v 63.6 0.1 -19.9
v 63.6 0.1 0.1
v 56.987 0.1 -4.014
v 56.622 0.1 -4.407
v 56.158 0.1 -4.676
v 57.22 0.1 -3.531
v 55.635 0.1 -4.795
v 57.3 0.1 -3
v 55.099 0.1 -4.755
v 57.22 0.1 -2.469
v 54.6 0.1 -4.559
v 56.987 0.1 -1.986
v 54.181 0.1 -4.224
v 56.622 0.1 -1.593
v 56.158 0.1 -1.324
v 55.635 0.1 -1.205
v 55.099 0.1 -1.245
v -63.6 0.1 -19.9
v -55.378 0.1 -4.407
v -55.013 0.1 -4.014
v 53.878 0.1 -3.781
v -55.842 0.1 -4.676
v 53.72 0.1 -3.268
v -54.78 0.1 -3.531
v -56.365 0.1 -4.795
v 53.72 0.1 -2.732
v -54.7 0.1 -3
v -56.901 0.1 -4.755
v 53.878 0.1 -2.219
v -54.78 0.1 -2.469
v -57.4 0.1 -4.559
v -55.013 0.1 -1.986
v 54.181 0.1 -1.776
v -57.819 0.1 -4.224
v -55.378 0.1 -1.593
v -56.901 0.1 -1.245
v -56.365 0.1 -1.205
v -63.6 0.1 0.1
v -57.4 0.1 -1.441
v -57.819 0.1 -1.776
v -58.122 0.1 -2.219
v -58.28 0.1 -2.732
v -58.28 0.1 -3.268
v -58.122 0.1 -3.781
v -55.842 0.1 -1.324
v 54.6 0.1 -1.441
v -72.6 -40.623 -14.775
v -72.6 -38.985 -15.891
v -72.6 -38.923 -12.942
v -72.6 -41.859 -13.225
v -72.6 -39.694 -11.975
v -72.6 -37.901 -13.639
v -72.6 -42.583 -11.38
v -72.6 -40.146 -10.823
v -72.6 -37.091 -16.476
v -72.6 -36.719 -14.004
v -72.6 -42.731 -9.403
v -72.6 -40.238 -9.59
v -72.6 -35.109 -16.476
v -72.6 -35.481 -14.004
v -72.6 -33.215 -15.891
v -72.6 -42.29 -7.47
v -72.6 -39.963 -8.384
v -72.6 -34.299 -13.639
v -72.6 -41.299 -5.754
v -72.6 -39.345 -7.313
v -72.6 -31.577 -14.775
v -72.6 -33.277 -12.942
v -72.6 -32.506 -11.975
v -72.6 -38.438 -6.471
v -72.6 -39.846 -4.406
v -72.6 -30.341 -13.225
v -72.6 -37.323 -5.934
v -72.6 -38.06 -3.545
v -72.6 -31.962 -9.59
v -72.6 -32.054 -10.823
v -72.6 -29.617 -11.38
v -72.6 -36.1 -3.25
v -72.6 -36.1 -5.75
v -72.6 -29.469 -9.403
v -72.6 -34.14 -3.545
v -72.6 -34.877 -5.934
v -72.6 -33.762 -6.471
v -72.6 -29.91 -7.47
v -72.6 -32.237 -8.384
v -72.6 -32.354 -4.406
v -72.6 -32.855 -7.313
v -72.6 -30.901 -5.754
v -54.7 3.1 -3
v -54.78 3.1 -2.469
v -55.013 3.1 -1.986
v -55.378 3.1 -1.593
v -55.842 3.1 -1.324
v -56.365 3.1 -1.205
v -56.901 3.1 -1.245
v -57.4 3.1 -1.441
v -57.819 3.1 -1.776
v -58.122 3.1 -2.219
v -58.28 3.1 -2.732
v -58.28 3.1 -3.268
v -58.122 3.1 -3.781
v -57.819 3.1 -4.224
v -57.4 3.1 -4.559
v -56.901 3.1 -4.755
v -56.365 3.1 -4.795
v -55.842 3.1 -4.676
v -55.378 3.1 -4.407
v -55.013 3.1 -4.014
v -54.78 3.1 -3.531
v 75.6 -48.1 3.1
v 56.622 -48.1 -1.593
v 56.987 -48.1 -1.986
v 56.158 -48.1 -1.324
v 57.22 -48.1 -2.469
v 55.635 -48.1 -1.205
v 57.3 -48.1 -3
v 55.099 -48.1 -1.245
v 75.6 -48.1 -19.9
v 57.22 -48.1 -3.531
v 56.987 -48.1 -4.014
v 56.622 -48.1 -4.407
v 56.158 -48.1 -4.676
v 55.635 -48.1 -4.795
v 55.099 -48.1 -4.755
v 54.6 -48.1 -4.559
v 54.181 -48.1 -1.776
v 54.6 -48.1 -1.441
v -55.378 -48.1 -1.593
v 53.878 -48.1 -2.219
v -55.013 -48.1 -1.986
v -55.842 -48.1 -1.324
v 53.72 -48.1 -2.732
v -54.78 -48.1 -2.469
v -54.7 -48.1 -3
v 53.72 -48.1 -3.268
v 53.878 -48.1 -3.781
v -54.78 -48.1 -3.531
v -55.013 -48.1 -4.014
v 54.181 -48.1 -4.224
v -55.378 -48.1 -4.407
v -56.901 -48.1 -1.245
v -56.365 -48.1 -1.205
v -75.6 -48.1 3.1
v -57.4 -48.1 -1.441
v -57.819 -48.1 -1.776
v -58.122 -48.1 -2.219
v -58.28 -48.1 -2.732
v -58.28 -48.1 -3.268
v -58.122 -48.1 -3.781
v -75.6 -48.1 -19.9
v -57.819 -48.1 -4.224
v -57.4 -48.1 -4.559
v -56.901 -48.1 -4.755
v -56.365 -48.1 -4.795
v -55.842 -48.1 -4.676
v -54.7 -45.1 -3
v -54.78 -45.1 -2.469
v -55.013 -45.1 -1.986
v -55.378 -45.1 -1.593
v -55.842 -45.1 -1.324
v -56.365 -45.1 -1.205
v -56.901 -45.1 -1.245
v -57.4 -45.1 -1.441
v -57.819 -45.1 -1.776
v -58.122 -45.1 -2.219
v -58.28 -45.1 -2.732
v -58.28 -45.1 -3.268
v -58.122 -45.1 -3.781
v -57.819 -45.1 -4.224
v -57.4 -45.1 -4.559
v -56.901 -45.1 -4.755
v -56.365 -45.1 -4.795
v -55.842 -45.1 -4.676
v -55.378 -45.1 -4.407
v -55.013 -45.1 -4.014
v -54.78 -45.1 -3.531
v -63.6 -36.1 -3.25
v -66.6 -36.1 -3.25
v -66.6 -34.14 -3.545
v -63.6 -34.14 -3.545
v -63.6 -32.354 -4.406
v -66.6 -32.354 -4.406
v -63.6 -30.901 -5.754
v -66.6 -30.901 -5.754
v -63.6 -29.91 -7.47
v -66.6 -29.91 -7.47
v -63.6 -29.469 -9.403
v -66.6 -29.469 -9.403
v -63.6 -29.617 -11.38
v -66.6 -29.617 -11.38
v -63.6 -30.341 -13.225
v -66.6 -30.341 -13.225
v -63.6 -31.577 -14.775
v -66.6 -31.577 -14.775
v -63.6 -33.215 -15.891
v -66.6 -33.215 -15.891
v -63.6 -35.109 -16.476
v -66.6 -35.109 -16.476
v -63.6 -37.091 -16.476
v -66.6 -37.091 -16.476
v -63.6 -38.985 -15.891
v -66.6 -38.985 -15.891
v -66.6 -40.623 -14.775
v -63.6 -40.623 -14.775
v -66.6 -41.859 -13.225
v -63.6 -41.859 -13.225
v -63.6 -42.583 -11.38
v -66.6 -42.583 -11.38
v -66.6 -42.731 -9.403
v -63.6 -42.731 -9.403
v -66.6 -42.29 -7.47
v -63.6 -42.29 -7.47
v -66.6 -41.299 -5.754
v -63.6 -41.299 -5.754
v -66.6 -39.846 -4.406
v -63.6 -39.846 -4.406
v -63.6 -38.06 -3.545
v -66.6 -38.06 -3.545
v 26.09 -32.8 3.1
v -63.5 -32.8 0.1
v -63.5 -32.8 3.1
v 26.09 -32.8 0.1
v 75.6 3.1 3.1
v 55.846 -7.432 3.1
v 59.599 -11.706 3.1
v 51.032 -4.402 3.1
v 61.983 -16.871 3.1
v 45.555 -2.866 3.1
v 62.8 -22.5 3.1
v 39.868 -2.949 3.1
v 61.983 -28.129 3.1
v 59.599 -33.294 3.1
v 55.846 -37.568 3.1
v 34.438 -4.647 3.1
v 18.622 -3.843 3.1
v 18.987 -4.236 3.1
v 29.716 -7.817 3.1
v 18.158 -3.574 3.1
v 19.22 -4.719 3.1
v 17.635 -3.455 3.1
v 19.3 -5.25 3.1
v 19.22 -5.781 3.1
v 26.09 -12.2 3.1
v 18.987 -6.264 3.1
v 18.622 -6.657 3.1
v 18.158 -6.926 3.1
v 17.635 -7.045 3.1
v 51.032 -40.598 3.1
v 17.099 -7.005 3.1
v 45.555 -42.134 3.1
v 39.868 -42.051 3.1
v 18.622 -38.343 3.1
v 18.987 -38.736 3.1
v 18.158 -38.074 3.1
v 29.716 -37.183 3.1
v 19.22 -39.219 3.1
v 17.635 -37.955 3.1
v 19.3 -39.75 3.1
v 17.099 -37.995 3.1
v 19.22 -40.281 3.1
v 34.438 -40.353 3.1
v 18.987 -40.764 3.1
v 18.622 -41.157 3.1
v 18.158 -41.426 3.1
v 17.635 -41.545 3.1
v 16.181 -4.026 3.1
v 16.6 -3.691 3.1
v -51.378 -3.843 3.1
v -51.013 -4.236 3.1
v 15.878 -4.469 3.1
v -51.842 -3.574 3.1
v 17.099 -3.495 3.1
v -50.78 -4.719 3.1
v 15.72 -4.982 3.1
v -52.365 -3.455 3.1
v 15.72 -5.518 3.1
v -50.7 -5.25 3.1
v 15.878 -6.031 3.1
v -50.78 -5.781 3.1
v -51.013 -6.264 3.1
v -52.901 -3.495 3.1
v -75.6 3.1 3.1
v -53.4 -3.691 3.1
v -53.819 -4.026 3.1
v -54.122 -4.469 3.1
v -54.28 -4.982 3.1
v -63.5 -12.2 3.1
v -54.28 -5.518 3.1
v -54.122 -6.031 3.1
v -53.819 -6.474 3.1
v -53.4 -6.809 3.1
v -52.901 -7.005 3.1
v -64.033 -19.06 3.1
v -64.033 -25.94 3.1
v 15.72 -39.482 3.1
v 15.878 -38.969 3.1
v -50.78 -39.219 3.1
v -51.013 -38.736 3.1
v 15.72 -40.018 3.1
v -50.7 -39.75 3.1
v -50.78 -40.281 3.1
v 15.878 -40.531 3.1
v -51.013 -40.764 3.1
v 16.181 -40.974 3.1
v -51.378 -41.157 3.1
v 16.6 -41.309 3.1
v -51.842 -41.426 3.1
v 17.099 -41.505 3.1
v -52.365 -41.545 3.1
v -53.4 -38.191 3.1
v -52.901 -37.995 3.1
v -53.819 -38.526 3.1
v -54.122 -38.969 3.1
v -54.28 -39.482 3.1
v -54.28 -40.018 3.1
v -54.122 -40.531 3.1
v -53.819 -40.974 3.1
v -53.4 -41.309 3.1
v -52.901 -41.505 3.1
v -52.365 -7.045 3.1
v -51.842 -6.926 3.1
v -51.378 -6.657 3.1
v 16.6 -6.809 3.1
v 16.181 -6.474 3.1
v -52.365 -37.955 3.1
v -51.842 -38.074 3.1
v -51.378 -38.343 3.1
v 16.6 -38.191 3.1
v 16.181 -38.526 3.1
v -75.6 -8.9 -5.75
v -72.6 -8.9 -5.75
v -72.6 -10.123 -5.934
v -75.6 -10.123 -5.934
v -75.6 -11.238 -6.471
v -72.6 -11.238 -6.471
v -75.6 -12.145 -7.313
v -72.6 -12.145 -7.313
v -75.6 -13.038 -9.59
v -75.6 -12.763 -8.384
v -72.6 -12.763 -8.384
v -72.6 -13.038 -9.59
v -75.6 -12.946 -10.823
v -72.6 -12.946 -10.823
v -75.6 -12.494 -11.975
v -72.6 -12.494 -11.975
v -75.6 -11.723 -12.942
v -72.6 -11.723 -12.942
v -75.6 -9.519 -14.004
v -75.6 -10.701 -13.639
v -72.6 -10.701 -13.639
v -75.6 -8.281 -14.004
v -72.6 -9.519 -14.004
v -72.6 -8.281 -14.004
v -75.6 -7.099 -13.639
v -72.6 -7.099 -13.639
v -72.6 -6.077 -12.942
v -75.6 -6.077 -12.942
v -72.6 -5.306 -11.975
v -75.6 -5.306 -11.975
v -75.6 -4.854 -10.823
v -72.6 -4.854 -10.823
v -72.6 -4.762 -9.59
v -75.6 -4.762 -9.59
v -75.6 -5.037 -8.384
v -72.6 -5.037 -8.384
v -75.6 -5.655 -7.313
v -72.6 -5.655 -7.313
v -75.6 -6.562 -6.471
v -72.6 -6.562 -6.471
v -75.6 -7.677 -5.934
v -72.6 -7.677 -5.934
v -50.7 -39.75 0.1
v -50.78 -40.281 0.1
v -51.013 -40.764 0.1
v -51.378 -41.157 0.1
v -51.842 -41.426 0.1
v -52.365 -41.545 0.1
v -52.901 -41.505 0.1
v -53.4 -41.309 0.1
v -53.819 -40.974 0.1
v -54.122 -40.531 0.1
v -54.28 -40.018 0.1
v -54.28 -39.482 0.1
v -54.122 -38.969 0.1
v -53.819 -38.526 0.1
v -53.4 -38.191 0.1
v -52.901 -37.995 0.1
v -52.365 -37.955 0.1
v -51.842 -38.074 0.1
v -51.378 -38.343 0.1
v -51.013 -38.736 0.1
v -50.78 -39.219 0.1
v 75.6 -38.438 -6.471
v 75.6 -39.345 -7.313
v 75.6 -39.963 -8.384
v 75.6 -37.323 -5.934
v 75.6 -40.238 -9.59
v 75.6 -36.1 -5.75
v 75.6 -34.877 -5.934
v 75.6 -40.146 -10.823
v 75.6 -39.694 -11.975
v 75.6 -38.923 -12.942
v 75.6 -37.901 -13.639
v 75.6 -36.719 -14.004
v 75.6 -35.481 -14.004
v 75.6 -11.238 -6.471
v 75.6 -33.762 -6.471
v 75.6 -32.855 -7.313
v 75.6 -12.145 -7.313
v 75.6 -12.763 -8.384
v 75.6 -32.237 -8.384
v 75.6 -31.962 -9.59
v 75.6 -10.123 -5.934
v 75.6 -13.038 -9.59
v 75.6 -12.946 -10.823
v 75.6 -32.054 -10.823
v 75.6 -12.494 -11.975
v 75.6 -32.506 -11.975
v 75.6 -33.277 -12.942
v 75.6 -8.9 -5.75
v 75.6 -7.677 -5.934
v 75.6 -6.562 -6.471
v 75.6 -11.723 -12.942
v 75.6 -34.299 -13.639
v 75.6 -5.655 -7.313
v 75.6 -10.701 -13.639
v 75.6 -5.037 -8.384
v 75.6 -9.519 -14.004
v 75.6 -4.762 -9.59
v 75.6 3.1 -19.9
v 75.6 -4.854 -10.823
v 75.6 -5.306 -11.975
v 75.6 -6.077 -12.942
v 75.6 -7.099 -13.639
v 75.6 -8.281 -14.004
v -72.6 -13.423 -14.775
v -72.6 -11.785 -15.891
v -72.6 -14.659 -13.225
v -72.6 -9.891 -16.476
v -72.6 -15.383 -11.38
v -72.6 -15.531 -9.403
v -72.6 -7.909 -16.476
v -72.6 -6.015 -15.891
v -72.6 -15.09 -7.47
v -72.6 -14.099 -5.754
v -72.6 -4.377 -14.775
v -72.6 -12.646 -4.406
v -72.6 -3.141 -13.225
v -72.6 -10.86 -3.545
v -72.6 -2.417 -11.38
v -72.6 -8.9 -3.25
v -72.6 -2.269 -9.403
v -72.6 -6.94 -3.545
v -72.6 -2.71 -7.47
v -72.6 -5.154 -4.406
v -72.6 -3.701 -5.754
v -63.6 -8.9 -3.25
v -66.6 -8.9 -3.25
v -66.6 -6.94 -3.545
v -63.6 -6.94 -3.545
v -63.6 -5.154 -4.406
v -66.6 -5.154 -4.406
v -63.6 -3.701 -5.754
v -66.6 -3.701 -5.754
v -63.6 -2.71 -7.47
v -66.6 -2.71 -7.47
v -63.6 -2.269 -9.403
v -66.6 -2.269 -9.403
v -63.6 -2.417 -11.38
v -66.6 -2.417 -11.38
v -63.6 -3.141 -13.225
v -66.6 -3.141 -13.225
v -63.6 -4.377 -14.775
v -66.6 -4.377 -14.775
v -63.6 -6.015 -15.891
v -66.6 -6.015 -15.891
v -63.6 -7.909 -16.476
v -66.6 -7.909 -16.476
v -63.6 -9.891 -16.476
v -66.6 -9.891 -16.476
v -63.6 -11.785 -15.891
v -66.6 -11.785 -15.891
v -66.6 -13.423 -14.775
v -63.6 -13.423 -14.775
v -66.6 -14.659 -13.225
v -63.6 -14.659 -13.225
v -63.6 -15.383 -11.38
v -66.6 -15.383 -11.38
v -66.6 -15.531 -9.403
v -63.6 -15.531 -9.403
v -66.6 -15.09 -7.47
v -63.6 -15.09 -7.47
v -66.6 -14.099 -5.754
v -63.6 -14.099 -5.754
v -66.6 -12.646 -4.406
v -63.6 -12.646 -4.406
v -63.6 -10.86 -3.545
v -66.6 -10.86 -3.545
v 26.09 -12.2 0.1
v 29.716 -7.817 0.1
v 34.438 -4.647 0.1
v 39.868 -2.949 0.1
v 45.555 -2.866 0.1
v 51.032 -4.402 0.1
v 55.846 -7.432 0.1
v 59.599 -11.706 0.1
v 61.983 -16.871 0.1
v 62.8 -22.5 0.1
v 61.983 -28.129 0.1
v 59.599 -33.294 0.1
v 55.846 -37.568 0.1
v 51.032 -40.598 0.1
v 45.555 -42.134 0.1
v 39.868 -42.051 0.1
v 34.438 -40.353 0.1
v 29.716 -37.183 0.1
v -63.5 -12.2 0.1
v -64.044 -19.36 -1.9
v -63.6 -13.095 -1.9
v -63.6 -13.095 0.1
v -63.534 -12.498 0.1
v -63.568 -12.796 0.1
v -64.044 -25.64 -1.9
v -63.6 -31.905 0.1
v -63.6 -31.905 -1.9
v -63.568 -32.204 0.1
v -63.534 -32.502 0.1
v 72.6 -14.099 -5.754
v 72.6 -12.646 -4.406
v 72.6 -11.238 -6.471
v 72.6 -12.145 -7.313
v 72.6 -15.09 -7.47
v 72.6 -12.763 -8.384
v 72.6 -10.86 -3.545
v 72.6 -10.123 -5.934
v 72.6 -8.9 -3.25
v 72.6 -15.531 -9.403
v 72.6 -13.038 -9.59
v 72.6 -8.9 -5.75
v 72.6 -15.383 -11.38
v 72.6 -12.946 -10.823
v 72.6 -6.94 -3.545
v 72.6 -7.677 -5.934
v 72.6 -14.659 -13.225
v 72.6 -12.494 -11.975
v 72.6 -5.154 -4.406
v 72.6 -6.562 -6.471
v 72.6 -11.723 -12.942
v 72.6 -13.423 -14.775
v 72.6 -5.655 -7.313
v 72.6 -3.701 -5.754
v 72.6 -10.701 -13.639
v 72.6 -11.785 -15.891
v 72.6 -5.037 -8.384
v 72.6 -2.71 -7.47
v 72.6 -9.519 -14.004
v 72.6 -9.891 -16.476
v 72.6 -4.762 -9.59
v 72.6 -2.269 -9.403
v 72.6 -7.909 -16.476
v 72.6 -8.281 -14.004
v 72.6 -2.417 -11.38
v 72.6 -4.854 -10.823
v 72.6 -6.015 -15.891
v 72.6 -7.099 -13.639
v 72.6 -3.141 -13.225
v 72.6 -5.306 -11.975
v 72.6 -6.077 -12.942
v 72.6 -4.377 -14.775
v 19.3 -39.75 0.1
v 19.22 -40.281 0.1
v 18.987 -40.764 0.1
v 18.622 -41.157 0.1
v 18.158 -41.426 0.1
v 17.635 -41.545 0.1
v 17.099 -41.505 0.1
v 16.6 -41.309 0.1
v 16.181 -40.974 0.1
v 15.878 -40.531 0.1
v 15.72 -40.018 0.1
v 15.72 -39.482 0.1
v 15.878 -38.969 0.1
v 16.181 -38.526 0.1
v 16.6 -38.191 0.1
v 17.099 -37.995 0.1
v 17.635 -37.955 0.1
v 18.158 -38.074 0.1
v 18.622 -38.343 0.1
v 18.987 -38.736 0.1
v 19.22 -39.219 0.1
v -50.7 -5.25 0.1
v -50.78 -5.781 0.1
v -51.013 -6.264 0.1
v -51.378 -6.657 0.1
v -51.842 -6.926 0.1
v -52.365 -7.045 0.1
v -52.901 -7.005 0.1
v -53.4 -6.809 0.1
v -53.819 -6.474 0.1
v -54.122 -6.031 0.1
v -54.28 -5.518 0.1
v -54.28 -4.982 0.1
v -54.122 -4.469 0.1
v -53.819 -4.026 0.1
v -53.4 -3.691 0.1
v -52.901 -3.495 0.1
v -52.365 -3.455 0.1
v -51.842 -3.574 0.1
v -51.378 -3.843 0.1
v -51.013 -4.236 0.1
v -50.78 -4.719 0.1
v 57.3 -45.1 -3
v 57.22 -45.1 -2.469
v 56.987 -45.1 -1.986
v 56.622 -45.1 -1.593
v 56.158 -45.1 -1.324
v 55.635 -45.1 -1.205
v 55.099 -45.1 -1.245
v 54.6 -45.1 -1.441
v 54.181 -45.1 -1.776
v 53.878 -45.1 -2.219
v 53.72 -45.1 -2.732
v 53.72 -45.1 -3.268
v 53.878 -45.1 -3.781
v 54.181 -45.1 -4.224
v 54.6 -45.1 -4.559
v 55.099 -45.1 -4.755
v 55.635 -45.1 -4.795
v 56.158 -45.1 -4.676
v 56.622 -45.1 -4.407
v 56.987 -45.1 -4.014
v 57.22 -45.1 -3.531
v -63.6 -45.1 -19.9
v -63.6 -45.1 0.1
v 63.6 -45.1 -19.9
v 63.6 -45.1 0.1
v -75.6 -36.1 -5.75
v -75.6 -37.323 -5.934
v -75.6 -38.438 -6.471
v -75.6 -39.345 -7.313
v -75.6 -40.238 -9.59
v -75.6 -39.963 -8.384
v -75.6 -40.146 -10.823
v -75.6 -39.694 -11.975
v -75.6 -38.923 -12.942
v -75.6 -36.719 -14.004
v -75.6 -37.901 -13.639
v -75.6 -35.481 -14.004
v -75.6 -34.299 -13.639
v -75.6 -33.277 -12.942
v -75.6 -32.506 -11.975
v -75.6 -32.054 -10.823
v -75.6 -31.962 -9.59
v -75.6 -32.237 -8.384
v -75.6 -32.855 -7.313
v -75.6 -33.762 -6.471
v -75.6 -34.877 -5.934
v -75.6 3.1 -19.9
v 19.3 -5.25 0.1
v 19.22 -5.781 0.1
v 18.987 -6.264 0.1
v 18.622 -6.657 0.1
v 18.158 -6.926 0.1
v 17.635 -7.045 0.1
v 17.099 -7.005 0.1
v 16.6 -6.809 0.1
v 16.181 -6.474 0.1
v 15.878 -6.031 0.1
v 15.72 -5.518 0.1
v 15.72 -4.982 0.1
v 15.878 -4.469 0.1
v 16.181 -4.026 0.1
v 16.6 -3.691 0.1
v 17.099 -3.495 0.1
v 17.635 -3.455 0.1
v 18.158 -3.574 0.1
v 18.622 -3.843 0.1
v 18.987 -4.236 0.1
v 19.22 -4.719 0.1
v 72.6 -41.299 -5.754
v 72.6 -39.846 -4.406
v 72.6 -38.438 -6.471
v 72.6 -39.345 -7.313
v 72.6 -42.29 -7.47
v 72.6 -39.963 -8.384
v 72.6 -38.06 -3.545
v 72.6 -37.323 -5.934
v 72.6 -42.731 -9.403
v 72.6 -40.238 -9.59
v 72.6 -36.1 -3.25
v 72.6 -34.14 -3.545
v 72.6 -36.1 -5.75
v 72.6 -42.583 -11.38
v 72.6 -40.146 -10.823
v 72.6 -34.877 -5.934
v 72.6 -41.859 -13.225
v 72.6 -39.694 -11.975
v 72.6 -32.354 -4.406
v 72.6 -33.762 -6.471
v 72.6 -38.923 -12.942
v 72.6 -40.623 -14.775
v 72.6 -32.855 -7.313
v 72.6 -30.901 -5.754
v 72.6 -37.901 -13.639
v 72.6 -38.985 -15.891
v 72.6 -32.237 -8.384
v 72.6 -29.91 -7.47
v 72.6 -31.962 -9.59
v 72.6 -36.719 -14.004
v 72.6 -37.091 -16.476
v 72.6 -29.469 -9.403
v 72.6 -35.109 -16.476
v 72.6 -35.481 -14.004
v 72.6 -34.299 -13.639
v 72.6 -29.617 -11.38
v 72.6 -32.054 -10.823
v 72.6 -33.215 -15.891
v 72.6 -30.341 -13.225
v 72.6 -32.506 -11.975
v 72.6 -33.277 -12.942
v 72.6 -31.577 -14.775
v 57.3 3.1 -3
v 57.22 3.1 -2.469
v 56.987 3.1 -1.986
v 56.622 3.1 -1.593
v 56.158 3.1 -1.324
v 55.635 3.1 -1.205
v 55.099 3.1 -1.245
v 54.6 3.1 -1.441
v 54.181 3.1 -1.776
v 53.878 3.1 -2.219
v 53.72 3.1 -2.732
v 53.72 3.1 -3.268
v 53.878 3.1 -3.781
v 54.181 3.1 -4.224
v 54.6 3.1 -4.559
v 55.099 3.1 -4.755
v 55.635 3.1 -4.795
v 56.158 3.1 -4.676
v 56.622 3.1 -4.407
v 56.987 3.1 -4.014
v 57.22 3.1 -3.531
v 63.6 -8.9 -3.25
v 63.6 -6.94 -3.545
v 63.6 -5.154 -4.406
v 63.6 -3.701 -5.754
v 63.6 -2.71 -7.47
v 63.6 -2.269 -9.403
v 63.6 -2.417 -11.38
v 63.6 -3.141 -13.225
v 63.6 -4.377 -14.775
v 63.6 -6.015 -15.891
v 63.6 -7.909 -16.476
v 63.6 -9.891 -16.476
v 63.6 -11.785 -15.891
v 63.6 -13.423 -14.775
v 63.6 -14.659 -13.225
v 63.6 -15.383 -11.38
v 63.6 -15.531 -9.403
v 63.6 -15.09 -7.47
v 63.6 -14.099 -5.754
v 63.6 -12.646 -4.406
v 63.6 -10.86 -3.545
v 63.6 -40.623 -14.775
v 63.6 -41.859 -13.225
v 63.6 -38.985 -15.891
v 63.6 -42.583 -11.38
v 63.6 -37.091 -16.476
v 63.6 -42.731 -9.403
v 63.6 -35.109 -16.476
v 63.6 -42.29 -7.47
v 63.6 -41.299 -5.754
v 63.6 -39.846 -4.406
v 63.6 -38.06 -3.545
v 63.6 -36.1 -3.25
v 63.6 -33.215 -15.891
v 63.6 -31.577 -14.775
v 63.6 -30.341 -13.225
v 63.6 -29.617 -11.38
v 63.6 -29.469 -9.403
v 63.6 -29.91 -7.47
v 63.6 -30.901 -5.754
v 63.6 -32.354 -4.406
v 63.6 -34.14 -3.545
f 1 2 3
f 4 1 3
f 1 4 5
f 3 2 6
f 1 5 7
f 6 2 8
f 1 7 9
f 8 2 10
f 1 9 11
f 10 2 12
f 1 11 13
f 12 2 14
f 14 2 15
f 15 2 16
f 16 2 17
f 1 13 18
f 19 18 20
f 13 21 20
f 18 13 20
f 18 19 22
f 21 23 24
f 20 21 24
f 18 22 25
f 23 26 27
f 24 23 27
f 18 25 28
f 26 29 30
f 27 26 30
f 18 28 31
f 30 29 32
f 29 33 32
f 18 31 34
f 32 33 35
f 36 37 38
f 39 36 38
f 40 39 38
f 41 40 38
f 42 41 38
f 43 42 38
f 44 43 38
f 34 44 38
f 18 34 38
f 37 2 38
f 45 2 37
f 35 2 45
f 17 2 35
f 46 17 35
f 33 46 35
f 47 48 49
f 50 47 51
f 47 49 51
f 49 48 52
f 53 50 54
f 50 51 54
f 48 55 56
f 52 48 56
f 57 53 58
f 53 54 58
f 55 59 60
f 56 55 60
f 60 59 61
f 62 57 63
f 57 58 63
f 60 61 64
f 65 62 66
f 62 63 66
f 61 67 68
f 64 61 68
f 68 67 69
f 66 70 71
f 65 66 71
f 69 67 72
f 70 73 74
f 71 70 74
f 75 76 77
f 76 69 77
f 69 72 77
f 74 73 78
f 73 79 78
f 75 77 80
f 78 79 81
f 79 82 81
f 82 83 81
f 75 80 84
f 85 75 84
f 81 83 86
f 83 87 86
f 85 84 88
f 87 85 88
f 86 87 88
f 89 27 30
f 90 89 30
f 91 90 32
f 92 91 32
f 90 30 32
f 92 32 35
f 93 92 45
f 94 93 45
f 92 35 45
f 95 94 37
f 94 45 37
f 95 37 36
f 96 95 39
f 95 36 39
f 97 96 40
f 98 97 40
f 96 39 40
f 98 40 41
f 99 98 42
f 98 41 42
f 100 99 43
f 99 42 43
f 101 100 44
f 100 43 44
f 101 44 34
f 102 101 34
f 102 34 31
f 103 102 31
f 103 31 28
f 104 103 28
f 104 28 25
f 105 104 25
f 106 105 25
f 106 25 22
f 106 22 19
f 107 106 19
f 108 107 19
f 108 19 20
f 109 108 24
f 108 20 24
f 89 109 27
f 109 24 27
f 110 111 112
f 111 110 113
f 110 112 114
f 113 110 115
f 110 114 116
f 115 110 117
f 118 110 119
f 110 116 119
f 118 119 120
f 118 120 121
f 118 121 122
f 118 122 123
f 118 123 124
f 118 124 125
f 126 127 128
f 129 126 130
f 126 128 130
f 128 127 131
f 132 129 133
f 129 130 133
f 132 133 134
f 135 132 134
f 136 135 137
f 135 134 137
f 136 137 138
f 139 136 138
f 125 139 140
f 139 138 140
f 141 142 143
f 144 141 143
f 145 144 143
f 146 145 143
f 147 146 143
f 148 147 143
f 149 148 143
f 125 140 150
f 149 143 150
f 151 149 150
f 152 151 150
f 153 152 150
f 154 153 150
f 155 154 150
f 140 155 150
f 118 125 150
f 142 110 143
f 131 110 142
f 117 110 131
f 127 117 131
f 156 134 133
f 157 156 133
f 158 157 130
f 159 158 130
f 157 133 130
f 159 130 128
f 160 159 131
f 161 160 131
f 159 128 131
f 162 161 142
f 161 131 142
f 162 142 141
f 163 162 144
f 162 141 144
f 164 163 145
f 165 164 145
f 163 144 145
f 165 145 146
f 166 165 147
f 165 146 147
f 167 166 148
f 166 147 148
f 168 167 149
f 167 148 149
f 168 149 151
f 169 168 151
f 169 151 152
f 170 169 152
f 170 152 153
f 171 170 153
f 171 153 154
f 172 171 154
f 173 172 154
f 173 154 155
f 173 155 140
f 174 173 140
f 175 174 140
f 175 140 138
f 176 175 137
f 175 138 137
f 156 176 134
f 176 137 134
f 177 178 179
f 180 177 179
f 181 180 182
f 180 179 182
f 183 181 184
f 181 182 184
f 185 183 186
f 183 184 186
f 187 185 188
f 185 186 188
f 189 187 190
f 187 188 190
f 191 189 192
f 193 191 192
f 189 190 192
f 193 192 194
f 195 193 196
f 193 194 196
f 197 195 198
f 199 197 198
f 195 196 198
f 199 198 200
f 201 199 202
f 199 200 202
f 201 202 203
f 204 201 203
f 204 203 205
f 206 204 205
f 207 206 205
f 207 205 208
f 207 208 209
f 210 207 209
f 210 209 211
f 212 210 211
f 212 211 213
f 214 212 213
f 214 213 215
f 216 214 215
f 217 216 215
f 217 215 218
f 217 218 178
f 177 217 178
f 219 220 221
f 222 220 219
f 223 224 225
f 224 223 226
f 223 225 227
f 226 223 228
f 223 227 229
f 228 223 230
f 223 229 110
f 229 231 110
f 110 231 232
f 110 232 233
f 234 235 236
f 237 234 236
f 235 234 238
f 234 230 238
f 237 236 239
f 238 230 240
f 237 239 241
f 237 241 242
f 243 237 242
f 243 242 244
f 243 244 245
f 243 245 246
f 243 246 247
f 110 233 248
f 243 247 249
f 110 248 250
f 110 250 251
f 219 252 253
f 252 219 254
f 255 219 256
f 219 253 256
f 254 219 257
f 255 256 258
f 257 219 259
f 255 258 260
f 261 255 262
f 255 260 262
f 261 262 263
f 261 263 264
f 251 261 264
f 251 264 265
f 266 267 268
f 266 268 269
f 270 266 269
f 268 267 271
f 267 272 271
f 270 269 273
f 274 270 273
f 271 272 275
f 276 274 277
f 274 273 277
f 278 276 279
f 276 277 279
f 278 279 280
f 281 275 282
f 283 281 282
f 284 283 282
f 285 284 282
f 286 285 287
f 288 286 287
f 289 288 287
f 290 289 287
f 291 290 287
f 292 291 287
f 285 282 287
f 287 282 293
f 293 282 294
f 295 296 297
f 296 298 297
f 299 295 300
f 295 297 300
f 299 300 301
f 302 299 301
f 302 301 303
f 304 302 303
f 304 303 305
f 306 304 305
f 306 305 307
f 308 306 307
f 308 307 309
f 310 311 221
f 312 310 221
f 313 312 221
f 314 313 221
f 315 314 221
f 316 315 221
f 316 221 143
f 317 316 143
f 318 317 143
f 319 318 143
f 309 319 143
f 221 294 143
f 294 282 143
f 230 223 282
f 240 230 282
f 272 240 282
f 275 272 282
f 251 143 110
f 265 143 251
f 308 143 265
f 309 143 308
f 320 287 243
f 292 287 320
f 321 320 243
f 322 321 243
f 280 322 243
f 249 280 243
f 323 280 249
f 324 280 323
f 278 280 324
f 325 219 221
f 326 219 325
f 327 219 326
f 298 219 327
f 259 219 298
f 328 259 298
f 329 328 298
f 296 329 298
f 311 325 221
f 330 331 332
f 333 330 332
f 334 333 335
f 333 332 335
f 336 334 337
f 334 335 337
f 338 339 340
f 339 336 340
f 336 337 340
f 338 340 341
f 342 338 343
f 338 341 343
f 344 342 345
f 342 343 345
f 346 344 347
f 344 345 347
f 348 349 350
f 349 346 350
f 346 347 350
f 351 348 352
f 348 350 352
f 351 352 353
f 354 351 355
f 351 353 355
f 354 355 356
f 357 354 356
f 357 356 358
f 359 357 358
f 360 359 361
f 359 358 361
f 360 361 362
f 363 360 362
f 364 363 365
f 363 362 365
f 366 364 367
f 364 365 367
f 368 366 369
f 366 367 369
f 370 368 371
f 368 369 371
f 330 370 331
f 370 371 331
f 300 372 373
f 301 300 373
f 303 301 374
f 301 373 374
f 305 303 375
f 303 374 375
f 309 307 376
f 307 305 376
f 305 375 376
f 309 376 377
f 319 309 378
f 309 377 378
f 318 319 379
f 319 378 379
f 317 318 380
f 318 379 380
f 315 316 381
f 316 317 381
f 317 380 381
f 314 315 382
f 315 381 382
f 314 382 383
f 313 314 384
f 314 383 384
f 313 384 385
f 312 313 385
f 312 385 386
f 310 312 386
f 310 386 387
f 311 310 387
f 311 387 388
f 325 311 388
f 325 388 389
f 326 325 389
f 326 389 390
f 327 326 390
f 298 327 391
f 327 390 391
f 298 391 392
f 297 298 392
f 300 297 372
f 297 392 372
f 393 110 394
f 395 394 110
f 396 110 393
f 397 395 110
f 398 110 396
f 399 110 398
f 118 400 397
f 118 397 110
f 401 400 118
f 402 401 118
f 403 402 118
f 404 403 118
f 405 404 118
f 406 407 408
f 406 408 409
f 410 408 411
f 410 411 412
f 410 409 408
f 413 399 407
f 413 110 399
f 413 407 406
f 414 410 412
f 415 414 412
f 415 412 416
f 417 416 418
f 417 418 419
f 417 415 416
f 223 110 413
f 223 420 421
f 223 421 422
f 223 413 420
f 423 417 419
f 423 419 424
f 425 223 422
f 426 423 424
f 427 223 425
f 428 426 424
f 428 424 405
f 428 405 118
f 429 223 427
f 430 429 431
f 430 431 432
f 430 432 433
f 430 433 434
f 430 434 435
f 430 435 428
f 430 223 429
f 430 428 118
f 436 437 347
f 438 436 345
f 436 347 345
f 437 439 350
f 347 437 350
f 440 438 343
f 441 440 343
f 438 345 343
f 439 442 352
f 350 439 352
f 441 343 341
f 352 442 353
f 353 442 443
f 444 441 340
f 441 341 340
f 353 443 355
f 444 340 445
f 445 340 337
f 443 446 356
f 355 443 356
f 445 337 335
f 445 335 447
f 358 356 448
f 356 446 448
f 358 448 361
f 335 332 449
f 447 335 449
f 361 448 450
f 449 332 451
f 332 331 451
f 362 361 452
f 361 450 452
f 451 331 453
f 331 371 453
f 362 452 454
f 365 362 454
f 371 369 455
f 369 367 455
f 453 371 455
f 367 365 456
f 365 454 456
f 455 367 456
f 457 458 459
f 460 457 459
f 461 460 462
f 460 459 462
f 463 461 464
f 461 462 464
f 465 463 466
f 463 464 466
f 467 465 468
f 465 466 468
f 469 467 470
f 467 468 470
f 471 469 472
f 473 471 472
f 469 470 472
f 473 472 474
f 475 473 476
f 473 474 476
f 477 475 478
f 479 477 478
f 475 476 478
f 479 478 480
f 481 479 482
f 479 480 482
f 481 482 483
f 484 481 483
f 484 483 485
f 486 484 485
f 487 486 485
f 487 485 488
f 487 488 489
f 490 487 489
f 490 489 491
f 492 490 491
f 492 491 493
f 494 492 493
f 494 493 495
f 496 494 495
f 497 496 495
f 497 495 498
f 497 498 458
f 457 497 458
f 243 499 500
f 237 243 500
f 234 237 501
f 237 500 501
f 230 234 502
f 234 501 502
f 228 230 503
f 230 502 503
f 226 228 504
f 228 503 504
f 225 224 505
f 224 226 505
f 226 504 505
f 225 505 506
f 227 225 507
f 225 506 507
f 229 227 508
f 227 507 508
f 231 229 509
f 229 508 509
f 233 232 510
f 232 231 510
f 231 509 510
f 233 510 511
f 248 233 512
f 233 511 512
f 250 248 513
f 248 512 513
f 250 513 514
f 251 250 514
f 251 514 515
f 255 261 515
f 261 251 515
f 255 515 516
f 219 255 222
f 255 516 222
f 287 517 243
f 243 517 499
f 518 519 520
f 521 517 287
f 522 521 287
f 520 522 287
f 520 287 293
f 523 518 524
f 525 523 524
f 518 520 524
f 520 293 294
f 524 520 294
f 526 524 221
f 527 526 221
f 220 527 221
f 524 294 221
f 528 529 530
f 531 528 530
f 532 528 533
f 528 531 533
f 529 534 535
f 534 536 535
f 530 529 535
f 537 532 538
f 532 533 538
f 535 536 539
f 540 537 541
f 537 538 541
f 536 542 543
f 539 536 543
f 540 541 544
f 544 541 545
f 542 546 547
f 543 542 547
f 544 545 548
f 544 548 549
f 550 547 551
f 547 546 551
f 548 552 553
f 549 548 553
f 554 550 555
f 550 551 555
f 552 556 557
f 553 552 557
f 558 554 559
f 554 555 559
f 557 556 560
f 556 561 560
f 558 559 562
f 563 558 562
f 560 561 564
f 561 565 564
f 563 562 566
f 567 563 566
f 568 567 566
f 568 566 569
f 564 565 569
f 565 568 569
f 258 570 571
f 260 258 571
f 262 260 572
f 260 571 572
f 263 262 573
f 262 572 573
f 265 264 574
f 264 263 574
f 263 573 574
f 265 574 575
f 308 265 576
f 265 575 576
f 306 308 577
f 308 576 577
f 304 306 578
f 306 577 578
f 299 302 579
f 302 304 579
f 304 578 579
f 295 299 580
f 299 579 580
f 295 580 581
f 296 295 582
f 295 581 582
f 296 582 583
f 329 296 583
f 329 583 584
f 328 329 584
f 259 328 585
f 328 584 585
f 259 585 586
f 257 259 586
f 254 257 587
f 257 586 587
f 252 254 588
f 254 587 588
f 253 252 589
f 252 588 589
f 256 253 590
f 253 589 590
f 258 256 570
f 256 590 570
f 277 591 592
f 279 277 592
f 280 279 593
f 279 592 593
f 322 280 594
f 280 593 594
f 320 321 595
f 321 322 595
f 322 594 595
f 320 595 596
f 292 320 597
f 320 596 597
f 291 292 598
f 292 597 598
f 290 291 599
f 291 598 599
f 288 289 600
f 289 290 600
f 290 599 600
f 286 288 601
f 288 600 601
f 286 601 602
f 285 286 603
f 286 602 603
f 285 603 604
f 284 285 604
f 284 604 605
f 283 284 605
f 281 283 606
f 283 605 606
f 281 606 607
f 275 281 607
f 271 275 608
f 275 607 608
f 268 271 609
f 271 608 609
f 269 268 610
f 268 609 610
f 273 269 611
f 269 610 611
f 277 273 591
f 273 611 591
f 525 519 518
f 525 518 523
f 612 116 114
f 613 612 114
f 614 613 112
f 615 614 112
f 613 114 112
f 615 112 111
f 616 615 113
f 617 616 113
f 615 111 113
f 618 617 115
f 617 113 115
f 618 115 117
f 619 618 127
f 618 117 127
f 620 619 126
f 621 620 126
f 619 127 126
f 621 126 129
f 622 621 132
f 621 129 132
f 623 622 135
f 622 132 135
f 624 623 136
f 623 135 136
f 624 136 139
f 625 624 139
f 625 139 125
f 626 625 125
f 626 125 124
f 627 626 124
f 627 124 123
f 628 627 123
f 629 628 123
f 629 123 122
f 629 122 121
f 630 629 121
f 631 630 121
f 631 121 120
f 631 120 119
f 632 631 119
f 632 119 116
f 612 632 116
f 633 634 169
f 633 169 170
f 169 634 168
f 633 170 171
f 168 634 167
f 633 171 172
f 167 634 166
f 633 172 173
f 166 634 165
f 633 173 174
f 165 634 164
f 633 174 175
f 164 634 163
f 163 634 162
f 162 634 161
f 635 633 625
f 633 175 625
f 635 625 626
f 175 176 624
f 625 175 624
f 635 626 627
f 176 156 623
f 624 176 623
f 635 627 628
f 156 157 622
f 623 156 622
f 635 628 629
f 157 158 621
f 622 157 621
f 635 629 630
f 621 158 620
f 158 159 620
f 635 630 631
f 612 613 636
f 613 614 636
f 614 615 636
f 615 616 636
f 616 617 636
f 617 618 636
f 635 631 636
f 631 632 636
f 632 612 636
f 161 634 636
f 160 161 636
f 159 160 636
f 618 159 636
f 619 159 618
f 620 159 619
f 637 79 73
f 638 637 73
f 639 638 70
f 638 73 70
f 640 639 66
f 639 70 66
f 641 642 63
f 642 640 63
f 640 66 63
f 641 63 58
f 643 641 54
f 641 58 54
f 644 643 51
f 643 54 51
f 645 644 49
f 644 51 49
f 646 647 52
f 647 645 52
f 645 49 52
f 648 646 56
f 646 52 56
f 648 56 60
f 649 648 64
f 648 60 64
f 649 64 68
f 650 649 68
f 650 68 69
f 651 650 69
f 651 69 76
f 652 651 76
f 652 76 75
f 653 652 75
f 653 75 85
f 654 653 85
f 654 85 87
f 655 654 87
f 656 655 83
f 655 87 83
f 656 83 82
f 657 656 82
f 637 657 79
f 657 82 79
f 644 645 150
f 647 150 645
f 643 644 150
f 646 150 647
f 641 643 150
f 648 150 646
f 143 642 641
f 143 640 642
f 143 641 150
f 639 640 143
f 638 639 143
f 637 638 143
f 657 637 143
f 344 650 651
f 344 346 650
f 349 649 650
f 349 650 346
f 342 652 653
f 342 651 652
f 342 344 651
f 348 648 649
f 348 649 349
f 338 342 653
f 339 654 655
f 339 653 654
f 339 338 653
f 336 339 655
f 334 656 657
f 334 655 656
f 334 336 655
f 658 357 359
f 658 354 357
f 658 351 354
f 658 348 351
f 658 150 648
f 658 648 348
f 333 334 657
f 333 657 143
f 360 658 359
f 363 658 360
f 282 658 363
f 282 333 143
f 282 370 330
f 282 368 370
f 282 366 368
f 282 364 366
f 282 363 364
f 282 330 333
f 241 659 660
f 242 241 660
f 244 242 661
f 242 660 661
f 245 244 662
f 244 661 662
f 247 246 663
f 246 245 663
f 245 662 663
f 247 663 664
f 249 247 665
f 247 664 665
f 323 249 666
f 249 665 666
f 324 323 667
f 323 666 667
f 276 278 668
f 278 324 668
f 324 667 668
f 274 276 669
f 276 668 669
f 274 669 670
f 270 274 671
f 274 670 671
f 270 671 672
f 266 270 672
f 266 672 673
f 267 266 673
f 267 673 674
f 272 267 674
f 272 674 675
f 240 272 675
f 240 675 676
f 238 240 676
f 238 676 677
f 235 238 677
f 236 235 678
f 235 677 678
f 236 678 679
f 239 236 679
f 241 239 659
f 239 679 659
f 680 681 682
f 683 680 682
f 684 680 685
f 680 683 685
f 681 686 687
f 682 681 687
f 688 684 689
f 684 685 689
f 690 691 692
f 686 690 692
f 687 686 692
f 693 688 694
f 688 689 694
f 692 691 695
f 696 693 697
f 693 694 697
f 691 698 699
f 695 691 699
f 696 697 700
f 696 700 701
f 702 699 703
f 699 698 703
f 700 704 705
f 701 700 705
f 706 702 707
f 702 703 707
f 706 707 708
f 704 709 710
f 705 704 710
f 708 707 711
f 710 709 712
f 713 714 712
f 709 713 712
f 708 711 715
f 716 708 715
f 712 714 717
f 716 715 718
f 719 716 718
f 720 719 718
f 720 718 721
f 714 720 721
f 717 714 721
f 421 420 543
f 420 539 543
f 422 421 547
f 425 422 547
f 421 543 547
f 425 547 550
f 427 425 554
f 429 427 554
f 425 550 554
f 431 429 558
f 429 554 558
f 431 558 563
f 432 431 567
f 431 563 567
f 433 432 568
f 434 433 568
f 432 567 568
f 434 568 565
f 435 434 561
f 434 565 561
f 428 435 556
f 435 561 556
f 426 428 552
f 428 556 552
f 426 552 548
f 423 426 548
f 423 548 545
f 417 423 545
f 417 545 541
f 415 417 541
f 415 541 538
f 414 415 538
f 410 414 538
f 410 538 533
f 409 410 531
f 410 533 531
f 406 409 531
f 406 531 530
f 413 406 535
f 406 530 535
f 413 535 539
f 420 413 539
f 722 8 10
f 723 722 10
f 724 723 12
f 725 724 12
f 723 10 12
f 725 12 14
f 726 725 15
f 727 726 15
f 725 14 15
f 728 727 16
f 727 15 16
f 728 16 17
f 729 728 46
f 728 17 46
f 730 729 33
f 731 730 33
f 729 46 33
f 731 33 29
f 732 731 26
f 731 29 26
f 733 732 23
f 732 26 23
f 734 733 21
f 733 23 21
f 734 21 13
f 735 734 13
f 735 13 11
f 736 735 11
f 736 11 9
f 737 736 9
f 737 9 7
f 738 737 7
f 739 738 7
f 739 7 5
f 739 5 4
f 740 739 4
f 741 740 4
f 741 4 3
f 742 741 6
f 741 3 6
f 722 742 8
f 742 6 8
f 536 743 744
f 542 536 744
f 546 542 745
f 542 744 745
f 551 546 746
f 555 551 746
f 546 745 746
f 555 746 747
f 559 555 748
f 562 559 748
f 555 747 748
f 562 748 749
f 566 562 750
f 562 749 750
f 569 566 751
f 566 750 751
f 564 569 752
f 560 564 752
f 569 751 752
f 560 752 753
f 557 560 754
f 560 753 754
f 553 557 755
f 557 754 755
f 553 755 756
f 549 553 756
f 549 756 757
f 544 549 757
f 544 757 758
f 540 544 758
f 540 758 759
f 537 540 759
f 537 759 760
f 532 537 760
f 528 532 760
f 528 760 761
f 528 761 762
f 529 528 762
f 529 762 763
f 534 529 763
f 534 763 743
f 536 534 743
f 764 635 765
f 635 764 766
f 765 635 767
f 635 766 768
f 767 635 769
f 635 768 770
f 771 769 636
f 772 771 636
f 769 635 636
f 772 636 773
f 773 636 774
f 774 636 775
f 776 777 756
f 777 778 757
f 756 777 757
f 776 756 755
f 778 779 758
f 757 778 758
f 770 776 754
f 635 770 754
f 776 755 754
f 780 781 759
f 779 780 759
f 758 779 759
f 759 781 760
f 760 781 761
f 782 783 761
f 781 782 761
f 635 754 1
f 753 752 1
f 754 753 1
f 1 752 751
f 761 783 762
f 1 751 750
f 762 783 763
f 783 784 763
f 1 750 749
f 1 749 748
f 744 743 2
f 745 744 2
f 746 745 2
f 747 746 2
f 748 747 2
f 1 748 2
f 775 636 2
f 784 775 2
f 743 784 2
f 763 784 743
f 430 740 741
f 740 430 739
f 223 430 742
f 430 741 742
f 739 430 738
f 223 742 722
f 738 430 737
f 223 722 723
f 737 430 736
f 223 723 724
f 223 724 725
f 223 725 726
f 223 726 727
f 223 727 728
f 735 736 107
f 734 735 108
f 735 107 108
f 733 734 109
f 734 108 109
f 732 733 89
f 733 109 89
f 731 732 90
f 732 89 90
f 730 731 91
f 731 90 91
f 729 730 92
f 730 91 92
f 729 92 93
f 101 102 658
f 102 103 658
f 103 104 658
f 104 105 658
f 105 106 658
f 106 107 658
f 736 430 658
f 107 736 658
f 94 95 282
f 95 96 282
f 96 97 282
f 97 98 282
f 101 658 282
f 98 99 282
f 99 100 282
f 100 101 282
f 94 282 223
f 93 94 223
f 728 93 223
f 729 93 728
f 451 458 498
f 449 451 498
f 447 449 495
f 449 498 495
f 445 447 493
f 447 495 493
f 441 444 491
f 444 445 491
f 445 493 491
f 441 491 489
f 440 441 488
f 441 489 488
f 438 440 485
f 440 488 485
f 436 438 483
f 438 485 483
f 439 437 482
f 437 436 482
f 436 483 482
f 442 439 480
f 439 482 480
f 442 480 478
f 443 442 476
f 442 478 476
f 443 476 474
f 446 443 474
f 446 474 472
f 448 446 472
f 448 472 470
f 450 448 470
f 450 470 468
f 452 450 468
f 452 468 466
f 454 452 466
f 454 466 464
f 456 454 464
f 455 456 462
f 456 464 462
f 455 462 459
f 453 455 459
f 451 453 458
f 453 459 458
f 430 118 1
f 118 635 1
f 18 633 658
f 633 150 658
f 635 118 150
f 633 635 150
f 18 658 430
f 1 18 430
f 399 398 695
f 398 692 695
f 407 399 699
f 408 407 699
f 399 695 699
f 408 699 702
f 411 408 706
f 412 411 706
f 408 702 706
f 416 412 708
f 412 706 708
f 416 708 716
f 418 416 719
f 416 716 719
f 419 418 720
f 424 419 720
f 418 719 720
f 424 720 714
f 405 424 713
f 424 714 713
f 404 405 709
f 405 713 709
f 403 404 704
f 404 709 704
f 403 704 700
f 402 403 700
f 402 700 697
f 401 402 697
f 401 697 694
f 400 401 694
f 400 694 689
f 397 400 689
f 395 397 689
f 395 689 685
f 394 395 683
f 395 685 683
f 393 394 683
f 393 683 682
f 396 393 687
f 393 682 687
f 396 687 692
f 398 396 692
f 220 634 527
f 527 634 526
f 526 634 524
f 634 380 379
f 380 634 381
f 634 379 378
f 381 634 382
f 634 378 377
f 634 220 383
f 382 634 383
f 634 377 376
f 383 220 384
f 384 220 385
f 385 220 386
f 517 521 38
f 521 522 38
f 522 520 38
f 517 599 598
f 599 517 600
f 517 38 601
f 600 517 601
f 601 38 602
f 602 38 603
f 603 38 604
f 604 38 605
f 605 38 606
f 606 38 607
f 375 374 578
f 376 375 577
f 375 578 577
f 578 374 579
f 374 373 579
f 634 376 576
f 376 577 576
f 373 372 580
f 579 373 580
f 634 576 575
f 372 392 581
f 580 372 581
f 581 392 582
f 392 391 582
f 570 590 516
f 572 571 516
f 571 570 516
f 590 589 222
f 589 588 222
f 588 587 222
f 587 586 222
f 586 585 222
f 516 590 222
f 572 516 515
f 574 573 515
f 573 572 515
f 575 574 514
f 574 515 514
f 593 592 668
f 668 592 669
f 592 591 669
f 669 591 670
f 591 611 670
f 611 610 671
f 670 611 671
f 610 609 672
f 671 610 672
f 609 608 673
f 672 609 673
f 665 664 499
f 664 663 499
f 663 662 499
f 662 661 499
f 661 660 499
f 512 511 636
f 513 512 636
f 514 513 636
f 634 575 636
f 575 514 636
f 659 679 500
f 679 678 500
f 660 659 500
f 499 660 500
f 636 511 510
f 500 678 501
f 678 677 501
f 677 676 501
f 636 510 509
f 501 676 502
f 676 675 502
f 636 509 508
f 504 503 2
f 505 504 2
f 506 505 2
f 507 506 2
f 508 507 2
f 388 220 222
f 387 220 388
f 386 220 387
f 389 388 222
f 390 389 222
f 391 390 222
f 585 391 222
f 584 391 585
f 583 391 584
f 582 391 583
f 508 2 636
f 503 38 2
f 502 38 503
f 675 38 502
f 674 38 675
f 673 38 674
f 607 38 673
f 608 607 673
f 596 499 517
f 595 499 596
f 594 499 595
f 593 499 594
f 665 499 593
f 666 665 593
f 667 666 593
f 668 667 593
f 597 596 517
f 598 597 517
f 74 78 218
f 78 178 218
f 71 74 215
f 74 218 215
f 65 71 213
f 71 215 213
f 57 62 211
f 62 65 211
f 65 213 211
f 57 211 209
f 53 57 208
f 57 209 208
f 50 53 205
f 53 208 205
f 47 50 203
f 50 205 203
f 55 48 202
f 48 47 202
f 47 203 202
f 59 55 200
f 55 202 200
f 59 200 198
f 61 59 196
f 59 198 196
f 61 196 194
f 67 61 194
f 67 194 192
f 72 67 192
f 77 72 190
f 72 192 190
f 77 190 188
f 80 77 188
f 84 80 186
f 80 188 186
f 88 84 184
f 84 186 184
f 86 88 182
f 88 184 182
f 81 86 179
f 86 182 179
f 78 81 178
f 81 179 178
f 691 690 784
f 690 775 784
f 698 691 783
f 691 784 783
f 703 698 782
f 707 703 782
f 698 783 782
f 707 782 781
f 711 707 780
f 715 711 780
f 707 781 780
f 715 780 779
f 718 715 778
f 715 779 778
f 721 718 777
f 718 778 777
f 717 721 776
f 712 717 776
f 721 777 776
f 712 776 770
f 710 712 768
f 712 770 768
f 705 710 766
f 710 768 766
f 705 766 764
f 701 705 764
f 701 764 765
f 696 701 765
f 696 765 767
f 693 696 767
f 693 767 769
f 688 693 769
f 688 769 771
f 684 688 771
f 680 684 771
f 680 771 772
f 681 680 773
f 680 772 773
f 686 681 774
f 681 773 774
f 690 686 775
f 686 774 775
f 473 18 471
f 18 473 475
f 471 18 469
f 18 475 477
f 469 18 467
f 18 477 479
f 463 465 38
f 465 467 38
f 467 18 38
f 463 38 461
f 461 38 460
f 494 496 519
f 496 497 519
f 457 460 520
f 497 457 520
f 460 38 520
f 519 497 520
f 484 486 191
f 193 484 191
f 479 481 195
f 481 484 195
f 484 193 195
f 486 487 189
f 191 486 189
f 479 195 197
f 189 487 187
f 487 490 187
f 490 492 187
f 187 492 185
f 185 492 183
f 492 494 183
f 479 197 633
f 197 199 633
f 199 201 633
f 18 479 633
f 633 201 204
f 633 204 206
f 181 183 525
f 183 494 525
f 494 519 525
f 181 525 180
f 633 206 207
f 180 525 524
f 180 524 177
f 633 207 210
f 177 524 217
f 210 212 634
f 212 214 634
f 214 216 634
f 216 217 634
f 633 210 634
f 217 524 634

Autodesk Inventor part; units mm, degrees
ref_plane "YZ Plane" through (0, 0, 0) normal (1, 0, 0) x (0, 1, 0)
ref_plane "XZ Plane" through (0, 0, 0) normal (0, 1, 0) x (-1, 0, 0)
ref_plane "Work Plane1" through (0, 0, 0.1) normal (0, 0, 1) x (1, 0, 0)
sketch "Sketch1" plane through (0, 0, 0.1) normal (0, 0, 1) x (1, 0, 0)
  circle A0 centre (-52.5, -39.75) radius 1.5 projected
  circle A1 centre (17.5, -5.25) radius 1.5 projected
  circle A2 centre (-52.5, -5.25) radius 1.5 projected
  circle A3 centre (17.5, -39.75) radius 1.5 projected
  line L0 (-62.5, -18) -> (-24, -18) projected
  line L1 (-24, -18) -> (-24, -27) projected
  line L2 (-24, -27) -> (-62.5, -27) projected
  line L3 (-62.5, -44) -> (-62.5, -27) construction
  line L4 (62.5, -44) -> (-62.5, -44) construction
  line L5 (62.5, -22.5) -> (62.5, -44) construction
  circle A4 centre (43, -22.5) radius 19.5 projected
  line L6 (62.5, -1) -> (62.5, -22.5) construction
  line L7 (-62.5, -1) -> (62.5, -1) construction
  line L8 (-62.5, -18) -> (-62.5, -1) construction
  circle A5 centre (43, -22.5) radius 19.8
  line L9 (23.5, -12.5) -> (-24, -12.5)
  line L10 (23.5, -32.5) -> (-24, -32.5)
  line L11 (23.5, -12.2) -> (-24, -12.2)
  line L12 (23.5, -32.8) -> (-24, -32.8)
  line L13 (-63.5, 0) -> (-63.5, -45) projected
  line L14 (63.5, 0) -> (-63.5, 0) projected
  line L15 (-63.5, -45) -> (63.5, -45) projected
  line L16 (63.5, -45) -> (63.5, 0) projected
  line L17 (66.6, -48.1) -> (-66.6, -48.1)
  line L18 (-66.6, -48.1) -> (-66.6, 3.1)
  line L19 (-66.6, 3.1) -> (66.6, 3.1)
  line L20 (66.6, 3.1) -> (66.6, -48.1)
  circle A6 centre (17.5, -39.75) radius 1.8
  circle A7 centre (17.5, -5.25) radius 1.8
  circle A8 centre (-52.5, -39.75) radius 1.8
  circle A9 centre (-52.5, -5.25) radius 1.8
  line L21 (23.5, -32.8) -> (26.0899, -32.8)
  line L22 (23.5, -12.2) -> (26.0899, -12.2)
  line L23 (-24, -12.2) -> (-63.5, -12.2)
  line L24 (-24, -32.8) -> (-63.5, -32.8)
  point P0 (0, 0)
  dimension "d0" = 0.3
  dimension "d1" = 0.3
  dimension "d2" = 0.3
  dimension "d3" = 3.1
  dimension "d4" = 0.3
  dimension "d5" = 0.3
  dimension "d6" = 0.3
  dimension "d7" = 0.3
extrude "Extrusion1" add sketch "Sketch1" along normal blind 3 contours A5 L22 L11 L23 L13 L14 L16 L15 L24 L12 L21 | L17 L18 L19 L20
sketch "Sketch2" plane through (0, 0, 0.1) normal (0, 0, -1) x (-1, 0, 0)
  circle A0 centre (52.5, -5.25) radius 1.8 construction
  circle A1 centre (52.5, -39.75) radius 1.8 construction
  circle A2 centre (-17.5, -5.25) radius 1.8 construction
  circle A3 centre (-17.5, -39.75) radius 1.8 construction
  line L0 (-66.6, -48.1) -> (66.6, -48.1) projected
  line L1 (66.6, -48.1) -> (66.6, 3.1) projected
  line L2 (66.6, 3.1) -> (-66.6, 3.1) projected
  line L3 (-66.6, 3.1) -> (-66.6, -48.1) projected
  line L4 (-26.0899, -12.2) -> (63.5, -12.2) construction
  line L5 (63.5, -12.2) -> (63.5, -32.8) construction
  line L6 (63.5, -32.8) -> (-26.0899, -32.8) construction
  arc A4 (-26.0899, -12.2) -> (-26.0899, -32.8) centre (-43, -22.5) ccw construction
  line L7 (-63.6, 0.1) -> (63.6, 0.1)
  line L8 (63.6, 0.1) -> (63.6, -45.1)
  line L9 (63.6, -45.1) -> (-63.6, -45.1)
  line L10 (-63.6, -45.1) -> (-63.6, 0.1)
  point P0 (0, 0)
  dimension "d10" = 3
extrude "Extrusion2" add sketch "Sketch2" along normal blind 20
sketch "Sketch3" plane through (-66.6, -48.1, 3.1) normal (0, -1, 0) x (1, 0, 0)
  line L0 (3.1, -4.1) -> (130.1, -4.1) construction
  line L1 (3.1, -119.3) -> (3.1, -4.1) projected
  line L2 (3.1, -119.3) -> (130.1, -119.3) projected
  line L3 (130.1, -4.1) -> (130.1, -119.3) projected
  circle A0 centre (122.1, -6.1) radius 1.5 construction
  circle A1 centre (10.1, -6.1) radius 1.5 construction
  circle A2 centre (10.1, -6.1) radius 1.8
  circle A3 centre (122.1, -6.1) radius 1.8
  point P0 (66.6, -3.1)
  dimension "d13" = 0.3
  dimension "d14" = 0.3
extrude "Extrusion3" cut sketch "Sketch3" against normal through all
sketch "Sketch4" plane through (-66.6, -48.1, 3.1) normal (-1, 0, 0) x (0, 0, 1)
  line L0 (-4.1, 3.1) -> (-4.1, 48.1) construction
  line L1 (-4.1, 3.1) -> (-119.3, 3.1) construction
  line L2 (-119.3, 3.1) -> (-119.3, 48.1) projected
  line L3 (-119.3, 48.1) -> (-4.1, 48.1) construction
  circle A0 centre (-6.1, 9.1) radius 1.5 construction
  circle A1 centre (-6.1, 42.1) radius 1.5 construction
  circle A2 centre (-13, 12) radius 6.65
  line L4 (0, 0) -> (-23, 0) projected
  line L5 (-23, 0) -> (-23, 51.2) projected
  line L6 (-23, 25.6) -> (0, 25.6) construction
  line L7 (0, 15.3) -> (0, 35.9) projected
  circle A3 centre (-13, 39.2) radius 6.65
  point P0 (-3.1, 48.1)
  dimension "d17" = 13.3
  dimension "d18" = 12
  dimension "d19" = 10
extrude "Extrusion4" cut sketch "Sketch4" against normal through all
sketch "Sketch5" plane through (-66.6, -48.1, 3.1) normal (-1, 0, 0) x (0, 0, 1)
  circle A0 centre (-13, 12) radius 6.65 projected
  circle A1 centre (-13, 39.2) radius 6.65 projected
  line L0 (0, 0) -> (-23, 0) projected
  line L1 (0, 51.2) -> (0, 0) projected
  line L2 (0, 51.2) -> (-23, 51.2) projected
  line L3 (-23, 0) -> (-23, 51.2) projected
  point P0 (-3.1, 48.1)
extrude "Extrusion5" add sketch "Sketch5" along normal blind 6
sketch "Sketch6" plane through (-72.6, -48.1, 3.1) normal (-1, 0, 0) x (0, 0, 1)
  circle A0 centre (-13, 39.2) radius 6.65 construction
  circle A1 centre (-13, 12) radius 6.65 construction
  line L0 (-23, 0) -> (0, 0) projected
  line L1 (0, 0) -> (0, 51.2) projected
  line L2 (0, 51.2) -> (-23, 51.2) projected
  line L3 (-23, 51.2) -> (-23, 0) projected
  circle A2 centre (-13, 12) radius 4.15
  circle A3 centre (-13, 39.2) radius 4.15
  point P0 (-3.1, 48.1)
  dimension "d24" = 8.3
  dimension "d25" = 8.3
extrude "Extrusion6" add sketch "Sketch6" along normal blind 3
ref_plane "Work Plane2" through (0, -45.1, 0.1) normal (1, 0, 0) x (0, 0, -1)
mirror "Mirror1" about plane through (0, -45.1, 0.1) normal (1, 0, 0) of "Extrusion5", "Extrusion6"
ref_plane "Work Plane3" through (-63.5, -27, 0) normal (0, 0, -1) x (0, 1, 0)
sketch "Sketch7" plane through (0, 0, 3.1) normal (0, 0, 1) x (1, 0, 0)
  circle A0 centre (-52.5, -5.25) radius 1.8 projected
  circle A1 centre (-52.5, -39.75) radius 1.8 projected
  circle A2 centre (17.5, -5.25) radius 1.8 projected
  circle A3 centre (17.5, -39.75) radius 1.8 projected
  line L0 (75.6, -48.1) -> (-75.6, -48.1) projected
  line L1 (75.6, -48.1) -> (75.6, 3.1) projected
  line L2 (-75.6, 3.1) -> (75.6, 3.1) projected
  line L3 (-75.6, -48.1) -> (-75.6, 3.1) projected
  line L4 (26.0899, -32.8) -> (-63.5, -32.8) projected
  line L5 (-63.5, -32.8) -> (-63.5, -12.2) projected
  line L6 (-63.5, -12.2) -> (26.0899, -12.2) projected
  arc A4 (26.0899, -32.8) -> (26.0899, -12.2) centre (43, -22.5) ccw projected
  line L7 (-63.5, -12.2) -> (-63.5, -32.8) projected
  line L8 (-63.6, 0.1) -> (-63.6, -45.1) construction
  arc A5 (-63.5, -12.2) -> (-63.5, -32.8) centre (24.6083, -22.5) ccw
  point P0 (0, 0)
  point P1 (-63.6, -22.5)
  point P2 (-64.1, -22.5)
  dimension "d28" = 0.5
extrude "Extrusion7" cut sketch "Sketch7" against normal blind 5 contours A5 L5
properties part number "Syringe Pump Holder"
